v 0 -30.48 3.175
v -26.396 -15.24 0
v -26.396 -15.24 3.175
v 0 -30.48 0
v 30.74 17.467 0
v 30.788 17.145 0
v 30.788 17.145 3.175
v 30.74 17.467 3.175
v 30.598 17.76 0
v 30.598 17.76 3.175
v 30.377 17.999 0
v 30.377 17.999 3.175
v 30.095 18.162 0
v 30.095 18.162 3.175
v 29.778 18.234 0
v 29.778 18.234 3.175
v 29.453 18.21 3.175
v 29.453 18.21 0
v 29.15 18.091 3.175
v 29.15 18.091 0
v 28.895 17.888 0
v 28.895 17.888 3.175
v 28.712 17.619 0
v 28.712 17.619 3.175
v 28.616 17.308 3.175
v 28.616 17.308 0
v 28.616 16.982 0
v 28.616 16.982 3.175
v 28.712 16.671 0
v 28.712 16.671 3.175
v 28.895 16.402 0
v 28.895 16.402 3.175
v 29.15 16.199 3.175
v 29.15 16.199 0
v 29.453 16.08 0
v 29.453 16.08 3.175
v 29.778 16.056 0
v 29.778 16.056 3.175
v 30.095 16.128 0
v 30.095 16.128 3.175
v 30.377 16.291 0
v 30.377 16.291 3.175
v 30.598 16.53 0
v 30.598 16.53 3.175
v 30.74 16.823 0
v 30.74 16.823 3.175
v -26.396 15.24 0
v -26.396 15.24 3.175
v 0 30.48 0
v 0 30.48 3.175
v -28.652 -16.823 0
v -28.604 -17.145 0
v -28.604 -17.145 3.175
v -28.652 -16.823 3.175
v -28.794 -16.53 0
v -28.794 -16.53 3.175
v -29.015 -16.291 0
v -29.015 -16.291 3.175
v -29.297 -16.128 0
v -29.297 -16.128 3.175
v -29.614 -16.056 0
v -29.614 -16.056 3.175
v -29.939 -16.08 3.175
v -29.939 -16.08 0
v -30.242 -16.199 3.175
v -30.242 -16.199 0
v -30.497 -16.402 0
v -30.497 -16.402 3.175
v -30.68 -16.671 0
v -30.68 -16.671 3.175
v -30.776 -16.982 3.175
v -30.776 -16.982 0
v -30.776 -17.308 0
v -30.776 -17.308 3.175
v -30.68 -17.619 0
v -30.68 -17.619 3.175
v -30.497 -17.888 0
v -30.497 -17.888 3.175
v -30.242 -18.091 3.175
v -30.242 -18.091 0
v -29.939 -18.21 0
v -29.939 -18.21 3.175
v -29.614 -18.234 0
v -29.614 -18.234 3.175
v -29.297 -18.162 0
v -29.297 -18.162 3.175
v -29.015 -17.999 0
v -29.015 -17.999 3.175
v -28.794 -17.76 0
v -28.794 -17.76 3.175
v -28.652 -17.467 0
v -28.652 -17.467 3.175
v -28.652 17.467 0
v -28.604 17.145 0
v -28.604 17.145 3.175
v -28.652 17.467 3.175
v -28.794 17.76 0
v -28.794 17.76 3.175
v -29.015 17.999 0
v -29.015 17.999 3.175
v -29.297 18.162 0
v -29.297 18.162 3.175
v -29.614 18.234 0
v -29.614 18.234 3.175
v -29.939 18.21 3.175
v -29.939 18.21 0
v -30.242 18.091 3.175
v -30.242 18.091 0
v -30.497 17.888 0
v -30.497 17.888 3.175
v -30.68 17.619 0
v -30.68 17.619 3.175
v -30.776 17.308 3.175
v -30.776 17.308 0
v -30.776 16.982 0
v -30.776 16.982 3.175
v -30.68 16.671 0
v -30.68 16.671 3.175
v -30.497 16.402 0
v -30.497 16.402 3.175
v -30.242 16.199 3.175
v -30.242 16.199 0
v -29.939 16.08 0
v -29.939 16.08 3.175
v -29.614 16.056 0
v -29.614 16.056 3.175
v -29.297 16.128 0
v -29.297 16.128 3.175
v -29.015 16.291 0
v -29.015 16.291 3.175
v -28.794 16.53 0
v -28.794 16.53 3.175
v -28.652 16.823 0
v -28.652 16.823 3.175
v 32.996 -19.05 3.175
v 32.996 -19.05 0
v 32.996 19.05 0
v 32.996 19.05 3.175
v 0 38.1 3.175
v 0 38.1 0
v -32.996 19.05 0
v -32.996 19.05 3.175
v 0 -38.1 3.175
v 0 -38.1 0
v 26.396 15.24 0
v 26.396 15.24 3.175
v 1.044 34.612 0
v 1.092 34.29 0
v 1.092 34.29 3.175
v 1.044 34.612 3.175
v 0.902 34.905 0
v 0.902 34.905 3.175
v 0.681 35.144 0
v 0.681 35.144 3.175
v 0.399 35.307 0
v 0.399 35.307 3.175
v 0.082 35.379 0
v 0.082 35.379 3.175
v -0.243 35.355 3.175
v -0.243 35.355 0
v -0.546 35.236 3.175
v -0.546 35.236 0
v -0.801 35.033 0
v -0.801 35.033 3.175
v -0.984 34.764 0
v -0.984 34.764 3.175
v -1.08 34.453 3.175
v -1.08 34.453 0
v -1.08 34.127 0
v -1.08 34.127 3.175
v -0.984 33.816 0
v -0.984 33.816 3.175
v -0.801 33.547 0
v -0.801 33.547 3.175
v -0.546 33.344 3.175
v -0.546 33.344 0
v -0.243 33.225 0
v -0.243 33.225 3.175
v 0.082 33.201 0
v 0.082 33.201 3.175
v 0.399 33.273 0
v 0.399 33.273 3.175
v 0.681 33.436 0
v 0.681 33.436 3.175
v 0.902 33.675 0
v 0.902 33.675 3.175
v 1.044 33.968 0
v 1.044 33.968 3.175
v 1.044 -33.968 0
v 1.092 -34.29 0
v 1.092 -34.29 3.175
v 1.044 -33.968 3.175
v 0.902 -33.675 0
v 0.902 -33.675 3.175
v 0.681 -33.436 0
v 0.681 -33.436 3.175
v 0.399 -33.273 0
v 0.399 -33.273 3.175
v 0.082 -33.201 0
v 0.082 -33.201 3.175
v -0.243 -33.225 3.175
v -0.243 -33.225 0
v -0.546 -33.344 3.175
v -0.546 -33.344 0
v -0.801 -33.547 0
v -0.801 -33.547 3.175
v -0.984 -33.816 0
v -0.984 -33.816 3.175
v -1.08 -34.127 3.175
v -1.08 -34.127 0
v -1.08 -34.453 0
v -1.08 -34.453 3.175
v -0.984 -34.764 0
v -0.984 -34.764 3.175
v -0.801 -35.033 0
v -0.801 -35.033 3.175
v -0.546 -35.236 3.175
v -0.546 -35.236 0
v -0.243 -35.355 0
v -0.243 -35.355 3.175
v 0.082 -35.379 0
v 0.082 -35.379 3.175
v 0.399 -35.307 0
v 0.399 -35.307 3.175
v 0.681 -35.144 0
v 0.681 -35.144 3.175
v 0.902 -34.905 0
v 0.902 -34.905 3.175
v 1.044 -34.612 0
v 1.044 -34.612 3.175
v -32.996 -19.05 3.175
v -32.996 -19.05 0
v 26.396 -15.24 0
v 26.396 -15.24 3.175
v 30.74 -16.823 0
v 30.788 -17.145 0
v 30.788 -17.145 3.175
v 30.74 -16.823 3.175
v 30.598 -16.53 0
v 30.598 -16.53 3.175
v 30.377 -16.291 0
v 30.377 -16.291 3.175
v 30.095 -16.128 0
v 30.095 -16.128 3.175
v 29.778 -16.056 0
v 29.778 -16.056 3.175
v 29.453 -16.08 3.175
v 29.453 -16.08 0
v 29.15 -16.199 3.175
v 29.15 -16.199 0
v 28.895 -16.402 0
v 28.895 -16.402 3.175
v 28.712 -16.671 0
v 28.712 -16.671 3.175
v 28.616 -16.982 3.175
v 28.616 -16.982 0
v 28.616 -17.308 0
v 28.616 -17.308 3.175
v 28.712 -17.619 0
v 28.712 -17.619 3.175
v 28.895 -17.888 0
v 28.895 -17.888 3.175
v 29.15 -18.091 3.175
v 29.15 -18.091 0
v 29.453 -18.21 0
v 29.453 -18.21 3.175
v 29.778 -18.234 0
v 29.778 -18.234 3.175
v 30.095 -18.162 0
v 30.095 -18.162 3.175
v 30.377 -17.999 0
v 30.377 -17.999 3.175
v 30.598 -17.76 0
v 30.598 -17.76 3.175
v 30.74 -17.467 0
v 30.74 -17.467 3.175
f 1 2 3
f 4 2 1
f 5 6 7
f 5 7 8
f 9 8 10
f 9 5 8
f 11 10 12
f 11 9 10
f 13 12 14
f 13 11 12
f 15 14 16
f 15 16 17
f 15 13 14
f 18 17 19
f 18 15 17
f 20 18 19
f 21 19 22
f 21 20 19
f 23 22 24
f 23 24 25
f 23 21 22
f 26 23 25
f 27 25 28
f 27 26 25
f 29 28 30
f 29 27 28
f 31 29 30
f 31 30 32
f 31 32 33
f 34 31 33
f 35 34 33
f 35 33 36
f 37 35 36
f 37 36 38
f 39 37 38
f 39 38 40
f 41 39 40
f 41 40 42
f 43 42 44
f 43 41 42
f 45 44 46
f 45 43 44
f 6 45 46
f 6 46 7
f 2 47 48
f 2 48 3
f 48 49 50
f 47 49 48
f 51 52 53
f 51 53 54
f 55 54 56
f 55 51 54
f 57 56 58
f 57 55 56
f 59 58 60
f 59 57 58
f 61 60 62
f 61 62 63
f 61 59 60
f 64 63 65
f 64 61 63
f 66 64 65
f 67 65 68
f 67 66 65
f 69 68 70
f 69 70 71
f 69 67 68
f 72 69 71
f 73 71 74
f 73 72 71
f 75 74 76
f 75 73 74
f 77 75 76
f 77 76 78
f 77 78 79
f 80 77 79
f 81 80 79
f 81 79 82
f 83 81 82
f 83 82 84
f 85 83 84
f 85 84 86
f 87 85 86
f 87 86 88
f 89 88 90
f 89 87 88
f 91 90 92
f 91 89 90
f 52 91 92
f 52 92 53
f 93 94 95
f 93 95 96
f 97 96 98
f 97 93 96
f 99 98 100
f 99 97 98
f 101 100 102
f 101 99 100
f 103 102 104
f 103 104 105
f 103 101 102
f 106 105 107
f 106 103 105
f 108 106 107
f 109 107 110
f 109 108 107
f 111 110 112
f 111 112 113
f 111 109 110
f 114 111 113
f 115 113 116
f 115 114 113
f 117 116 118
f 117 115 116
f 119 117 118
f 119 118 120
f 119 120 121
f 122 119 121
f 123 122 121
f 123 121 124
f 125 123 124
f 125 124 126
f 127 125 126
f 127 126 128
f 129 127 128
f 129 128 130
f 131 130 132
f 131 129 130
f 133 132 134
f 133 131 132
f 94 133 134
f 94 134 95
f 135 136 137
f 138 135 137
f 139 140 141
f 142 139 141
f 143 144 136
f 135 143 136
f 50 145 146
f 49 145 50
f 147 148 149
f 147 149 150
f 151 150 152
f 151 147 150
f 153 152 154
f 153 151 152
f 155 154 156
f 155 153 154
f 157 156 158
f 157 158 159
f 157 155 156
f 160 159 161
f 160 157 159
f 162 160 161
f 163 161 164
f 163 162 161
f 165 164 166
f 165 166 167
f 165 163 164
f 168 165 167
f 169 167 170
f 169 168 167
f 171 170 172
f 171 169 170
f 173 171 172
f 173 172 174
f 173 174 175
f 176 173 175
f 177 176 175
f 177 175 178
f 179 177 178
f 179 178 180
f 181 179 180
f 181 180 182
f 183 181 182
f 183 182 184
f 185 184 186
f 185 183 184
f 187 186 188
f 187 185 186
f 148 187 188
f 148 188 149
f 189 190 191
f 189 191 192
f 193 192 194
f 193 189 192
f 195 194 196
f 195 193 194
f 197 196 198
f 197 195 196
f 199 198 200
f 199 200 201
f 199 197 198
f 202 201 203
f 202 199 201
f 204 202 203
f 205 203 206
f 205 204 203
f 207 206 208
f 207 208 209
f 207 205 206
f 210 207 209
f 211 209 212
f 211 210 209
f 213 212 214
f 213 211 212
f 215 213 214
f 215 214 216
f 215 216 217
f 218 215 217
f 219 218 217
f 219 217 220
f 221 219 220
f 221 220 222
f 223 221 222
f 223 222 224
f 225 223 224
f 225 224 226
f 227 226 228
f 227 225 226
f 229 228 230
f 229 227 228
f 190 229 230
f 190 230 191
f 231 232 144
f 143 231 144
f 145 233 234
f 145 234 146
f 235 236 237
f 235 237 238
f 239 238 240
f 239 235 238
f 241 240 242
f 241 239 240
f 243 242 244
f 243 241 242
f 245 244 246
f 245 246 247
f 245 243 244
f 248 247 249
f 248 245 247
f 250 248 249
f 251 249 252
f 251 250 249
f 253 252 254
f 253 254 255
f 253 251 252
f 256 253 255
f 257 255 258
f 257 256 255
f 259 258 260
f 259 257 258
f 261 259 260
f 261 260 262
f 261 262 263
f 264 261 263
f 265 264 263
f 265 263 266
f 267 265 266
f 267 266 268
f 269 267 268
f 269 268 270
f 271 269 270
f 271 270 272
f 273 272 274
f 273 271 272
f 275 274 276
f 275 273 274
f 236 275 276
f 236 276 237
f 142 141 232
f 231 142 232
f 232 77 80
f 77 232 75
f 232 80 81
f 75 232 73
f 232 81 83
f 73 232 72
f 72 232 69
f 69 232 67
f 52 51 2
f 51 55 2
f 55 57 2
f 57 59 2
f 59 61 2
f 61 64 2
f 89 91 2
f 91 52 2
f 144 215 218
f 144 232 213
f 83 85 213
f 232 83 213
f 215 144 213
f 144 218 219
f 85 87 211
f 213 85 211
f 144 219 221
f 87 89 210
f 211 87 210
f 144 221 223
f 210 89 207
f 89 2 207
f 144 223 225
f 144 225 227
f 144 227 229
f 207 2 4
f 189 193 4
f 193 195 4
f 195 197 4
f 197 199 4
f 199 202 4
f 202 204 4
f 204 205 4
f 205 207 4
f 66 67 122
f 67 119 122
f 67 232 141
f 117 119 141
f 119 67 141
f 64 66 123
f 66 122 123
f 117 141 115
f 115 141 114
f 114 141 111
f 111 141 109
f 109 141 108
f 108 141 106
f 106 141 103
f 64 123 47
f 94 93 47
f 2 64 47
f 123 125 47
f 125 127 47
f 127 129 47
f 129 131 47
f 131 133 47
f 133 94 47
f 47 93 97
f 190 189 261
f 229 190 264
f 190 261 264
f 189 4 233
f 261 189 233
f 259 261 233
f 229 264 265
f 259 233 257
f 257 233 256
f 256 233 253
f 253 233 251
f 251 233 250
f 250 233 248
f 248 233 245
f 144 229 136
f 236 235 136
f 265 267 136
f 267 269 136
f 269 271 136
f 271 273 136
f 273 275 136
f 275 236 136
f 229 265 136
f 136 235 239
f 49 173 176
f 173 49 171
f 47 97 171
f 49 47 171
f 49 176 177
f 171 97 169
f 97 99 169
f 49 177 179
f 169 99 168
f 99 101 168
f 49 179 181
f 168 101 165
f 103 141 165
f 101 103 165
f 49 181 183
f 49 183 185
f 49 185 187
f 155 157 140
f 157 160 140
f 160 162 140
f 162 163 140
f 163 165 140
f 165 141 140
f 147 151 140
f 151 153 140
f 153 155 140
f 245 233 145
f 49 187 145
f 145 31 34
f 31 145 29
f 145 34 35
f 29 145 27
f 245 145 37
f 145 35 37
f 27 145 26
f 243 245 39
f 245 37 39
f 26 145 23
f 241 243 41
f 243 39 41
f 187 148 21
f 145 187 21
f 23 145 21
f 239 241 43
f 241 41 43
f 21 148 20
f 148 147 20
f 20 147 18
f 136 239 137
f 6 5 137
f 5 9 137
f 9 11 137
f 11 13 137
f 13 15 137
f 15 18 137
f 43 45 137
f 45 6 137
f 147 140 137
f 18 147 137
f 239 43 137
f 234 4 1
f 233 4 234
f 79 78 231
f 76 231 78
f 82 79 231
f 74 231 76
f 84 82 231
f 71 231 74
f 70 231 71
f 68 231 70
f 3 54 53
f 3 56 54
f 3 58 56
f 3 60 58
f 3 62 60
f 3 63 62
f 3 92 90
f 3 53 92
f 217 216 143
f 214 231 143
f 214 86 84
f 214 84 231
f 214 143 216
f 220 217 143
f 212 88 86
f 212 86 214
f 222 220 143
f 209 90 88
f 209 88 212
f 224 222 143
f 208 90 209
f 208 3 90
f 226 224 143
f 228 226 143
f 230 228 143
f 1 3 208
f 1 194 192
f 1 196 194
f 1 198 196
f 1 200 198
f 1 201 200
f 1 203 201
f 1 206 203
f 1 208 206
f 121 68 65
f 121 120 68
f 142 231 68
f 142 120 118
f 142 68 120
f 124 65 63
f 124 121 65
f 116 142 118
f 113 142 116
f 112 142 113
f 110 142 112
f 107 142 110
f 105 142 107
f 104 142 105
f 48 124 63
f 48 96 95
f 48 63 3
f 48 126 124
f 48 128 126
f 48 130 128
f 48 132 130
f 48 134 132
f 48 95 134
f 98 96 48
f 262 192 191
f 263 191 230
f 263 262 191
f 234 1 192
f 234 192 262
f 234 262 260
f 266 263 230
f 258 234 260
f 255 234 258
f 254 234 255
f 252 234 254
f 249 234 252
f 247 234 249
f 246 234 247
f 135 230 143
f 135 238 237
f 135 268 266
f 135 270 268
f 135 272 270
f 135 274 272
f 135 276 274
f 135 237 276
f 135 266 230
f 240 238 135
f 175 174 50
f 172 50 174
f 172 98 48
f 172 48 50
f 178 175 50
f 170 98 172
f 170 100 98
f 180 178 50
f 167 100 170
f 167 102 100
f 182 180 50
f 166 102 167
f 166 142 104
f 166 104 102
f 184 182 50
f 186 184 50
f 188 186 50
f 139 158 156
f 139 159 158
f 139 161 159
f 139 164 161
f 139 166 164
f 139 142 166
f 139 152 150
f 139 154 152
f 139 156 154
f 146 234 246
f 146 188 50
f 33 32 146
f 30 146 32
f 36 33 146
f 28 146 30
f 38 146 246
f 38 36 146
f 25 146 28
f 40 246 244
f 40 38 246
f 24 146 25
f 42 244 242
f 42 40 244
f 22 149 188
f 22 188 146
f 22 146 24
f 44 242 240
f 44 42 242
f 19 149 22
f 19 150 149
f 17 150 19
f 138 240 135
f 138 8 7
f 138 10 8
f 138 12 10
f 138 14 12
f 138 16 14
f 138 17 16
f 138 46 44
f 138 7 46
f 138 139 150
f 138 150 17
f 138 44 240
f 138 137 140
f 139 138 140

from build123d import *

# Parameters (mm, degrees)
SKETCH1_R           = 1.0922
BOSS_EXTRUDE1_DEPTH = 3.175


with BuildPart() as part:
    # Sketch1 → Boss-Extrude1 (new body)
    with BuildSketch(Plane.XY):
        Polygon((32.995567884, 19.05), (0, 38.1), (-32.995567884, 19.05), (-32.995567884, -19.05), (0, -38.1), (32.995567884, -19.05), align=None)
        with Locations((-29.696011096, 17.145)):
            Circle(SKETCH1_R, mode=Mode.SUBTRACT)
        with Locations((0, 34.29)):
            Circle(SKETCH1_R, mode=Mode.SUBTRACT)
        with Locations((29.696011096, 17.145)):
            Circle(SKETCH1_R, mode=Mode.SUBTRACT)
        with Locations((29.696011096, -17.145)):
            Circle(SKETCH1_R, mode=Mode.SUBTRACT)
        with Locations((0, -34.29)):
            Circle(SKETCH1_R, mode=Mode.SUBTRACT)
        with Locations((-29.696011096, -17.145)):
            Circle(SKETCH1_R, mode=Mode.SUBTRACT)
        Polygon((26.396454307, 15.24), (0, 30.48), (-26.396454307, 15.24), (-26.396454307, -15.24), (0, -30.48), (26.396454307, -15.24), align=None, mode=Mode.SUBTRACT)
    extrude(amount=BOSS_EXTRUDE1_DEPTH)


solid = part.part
